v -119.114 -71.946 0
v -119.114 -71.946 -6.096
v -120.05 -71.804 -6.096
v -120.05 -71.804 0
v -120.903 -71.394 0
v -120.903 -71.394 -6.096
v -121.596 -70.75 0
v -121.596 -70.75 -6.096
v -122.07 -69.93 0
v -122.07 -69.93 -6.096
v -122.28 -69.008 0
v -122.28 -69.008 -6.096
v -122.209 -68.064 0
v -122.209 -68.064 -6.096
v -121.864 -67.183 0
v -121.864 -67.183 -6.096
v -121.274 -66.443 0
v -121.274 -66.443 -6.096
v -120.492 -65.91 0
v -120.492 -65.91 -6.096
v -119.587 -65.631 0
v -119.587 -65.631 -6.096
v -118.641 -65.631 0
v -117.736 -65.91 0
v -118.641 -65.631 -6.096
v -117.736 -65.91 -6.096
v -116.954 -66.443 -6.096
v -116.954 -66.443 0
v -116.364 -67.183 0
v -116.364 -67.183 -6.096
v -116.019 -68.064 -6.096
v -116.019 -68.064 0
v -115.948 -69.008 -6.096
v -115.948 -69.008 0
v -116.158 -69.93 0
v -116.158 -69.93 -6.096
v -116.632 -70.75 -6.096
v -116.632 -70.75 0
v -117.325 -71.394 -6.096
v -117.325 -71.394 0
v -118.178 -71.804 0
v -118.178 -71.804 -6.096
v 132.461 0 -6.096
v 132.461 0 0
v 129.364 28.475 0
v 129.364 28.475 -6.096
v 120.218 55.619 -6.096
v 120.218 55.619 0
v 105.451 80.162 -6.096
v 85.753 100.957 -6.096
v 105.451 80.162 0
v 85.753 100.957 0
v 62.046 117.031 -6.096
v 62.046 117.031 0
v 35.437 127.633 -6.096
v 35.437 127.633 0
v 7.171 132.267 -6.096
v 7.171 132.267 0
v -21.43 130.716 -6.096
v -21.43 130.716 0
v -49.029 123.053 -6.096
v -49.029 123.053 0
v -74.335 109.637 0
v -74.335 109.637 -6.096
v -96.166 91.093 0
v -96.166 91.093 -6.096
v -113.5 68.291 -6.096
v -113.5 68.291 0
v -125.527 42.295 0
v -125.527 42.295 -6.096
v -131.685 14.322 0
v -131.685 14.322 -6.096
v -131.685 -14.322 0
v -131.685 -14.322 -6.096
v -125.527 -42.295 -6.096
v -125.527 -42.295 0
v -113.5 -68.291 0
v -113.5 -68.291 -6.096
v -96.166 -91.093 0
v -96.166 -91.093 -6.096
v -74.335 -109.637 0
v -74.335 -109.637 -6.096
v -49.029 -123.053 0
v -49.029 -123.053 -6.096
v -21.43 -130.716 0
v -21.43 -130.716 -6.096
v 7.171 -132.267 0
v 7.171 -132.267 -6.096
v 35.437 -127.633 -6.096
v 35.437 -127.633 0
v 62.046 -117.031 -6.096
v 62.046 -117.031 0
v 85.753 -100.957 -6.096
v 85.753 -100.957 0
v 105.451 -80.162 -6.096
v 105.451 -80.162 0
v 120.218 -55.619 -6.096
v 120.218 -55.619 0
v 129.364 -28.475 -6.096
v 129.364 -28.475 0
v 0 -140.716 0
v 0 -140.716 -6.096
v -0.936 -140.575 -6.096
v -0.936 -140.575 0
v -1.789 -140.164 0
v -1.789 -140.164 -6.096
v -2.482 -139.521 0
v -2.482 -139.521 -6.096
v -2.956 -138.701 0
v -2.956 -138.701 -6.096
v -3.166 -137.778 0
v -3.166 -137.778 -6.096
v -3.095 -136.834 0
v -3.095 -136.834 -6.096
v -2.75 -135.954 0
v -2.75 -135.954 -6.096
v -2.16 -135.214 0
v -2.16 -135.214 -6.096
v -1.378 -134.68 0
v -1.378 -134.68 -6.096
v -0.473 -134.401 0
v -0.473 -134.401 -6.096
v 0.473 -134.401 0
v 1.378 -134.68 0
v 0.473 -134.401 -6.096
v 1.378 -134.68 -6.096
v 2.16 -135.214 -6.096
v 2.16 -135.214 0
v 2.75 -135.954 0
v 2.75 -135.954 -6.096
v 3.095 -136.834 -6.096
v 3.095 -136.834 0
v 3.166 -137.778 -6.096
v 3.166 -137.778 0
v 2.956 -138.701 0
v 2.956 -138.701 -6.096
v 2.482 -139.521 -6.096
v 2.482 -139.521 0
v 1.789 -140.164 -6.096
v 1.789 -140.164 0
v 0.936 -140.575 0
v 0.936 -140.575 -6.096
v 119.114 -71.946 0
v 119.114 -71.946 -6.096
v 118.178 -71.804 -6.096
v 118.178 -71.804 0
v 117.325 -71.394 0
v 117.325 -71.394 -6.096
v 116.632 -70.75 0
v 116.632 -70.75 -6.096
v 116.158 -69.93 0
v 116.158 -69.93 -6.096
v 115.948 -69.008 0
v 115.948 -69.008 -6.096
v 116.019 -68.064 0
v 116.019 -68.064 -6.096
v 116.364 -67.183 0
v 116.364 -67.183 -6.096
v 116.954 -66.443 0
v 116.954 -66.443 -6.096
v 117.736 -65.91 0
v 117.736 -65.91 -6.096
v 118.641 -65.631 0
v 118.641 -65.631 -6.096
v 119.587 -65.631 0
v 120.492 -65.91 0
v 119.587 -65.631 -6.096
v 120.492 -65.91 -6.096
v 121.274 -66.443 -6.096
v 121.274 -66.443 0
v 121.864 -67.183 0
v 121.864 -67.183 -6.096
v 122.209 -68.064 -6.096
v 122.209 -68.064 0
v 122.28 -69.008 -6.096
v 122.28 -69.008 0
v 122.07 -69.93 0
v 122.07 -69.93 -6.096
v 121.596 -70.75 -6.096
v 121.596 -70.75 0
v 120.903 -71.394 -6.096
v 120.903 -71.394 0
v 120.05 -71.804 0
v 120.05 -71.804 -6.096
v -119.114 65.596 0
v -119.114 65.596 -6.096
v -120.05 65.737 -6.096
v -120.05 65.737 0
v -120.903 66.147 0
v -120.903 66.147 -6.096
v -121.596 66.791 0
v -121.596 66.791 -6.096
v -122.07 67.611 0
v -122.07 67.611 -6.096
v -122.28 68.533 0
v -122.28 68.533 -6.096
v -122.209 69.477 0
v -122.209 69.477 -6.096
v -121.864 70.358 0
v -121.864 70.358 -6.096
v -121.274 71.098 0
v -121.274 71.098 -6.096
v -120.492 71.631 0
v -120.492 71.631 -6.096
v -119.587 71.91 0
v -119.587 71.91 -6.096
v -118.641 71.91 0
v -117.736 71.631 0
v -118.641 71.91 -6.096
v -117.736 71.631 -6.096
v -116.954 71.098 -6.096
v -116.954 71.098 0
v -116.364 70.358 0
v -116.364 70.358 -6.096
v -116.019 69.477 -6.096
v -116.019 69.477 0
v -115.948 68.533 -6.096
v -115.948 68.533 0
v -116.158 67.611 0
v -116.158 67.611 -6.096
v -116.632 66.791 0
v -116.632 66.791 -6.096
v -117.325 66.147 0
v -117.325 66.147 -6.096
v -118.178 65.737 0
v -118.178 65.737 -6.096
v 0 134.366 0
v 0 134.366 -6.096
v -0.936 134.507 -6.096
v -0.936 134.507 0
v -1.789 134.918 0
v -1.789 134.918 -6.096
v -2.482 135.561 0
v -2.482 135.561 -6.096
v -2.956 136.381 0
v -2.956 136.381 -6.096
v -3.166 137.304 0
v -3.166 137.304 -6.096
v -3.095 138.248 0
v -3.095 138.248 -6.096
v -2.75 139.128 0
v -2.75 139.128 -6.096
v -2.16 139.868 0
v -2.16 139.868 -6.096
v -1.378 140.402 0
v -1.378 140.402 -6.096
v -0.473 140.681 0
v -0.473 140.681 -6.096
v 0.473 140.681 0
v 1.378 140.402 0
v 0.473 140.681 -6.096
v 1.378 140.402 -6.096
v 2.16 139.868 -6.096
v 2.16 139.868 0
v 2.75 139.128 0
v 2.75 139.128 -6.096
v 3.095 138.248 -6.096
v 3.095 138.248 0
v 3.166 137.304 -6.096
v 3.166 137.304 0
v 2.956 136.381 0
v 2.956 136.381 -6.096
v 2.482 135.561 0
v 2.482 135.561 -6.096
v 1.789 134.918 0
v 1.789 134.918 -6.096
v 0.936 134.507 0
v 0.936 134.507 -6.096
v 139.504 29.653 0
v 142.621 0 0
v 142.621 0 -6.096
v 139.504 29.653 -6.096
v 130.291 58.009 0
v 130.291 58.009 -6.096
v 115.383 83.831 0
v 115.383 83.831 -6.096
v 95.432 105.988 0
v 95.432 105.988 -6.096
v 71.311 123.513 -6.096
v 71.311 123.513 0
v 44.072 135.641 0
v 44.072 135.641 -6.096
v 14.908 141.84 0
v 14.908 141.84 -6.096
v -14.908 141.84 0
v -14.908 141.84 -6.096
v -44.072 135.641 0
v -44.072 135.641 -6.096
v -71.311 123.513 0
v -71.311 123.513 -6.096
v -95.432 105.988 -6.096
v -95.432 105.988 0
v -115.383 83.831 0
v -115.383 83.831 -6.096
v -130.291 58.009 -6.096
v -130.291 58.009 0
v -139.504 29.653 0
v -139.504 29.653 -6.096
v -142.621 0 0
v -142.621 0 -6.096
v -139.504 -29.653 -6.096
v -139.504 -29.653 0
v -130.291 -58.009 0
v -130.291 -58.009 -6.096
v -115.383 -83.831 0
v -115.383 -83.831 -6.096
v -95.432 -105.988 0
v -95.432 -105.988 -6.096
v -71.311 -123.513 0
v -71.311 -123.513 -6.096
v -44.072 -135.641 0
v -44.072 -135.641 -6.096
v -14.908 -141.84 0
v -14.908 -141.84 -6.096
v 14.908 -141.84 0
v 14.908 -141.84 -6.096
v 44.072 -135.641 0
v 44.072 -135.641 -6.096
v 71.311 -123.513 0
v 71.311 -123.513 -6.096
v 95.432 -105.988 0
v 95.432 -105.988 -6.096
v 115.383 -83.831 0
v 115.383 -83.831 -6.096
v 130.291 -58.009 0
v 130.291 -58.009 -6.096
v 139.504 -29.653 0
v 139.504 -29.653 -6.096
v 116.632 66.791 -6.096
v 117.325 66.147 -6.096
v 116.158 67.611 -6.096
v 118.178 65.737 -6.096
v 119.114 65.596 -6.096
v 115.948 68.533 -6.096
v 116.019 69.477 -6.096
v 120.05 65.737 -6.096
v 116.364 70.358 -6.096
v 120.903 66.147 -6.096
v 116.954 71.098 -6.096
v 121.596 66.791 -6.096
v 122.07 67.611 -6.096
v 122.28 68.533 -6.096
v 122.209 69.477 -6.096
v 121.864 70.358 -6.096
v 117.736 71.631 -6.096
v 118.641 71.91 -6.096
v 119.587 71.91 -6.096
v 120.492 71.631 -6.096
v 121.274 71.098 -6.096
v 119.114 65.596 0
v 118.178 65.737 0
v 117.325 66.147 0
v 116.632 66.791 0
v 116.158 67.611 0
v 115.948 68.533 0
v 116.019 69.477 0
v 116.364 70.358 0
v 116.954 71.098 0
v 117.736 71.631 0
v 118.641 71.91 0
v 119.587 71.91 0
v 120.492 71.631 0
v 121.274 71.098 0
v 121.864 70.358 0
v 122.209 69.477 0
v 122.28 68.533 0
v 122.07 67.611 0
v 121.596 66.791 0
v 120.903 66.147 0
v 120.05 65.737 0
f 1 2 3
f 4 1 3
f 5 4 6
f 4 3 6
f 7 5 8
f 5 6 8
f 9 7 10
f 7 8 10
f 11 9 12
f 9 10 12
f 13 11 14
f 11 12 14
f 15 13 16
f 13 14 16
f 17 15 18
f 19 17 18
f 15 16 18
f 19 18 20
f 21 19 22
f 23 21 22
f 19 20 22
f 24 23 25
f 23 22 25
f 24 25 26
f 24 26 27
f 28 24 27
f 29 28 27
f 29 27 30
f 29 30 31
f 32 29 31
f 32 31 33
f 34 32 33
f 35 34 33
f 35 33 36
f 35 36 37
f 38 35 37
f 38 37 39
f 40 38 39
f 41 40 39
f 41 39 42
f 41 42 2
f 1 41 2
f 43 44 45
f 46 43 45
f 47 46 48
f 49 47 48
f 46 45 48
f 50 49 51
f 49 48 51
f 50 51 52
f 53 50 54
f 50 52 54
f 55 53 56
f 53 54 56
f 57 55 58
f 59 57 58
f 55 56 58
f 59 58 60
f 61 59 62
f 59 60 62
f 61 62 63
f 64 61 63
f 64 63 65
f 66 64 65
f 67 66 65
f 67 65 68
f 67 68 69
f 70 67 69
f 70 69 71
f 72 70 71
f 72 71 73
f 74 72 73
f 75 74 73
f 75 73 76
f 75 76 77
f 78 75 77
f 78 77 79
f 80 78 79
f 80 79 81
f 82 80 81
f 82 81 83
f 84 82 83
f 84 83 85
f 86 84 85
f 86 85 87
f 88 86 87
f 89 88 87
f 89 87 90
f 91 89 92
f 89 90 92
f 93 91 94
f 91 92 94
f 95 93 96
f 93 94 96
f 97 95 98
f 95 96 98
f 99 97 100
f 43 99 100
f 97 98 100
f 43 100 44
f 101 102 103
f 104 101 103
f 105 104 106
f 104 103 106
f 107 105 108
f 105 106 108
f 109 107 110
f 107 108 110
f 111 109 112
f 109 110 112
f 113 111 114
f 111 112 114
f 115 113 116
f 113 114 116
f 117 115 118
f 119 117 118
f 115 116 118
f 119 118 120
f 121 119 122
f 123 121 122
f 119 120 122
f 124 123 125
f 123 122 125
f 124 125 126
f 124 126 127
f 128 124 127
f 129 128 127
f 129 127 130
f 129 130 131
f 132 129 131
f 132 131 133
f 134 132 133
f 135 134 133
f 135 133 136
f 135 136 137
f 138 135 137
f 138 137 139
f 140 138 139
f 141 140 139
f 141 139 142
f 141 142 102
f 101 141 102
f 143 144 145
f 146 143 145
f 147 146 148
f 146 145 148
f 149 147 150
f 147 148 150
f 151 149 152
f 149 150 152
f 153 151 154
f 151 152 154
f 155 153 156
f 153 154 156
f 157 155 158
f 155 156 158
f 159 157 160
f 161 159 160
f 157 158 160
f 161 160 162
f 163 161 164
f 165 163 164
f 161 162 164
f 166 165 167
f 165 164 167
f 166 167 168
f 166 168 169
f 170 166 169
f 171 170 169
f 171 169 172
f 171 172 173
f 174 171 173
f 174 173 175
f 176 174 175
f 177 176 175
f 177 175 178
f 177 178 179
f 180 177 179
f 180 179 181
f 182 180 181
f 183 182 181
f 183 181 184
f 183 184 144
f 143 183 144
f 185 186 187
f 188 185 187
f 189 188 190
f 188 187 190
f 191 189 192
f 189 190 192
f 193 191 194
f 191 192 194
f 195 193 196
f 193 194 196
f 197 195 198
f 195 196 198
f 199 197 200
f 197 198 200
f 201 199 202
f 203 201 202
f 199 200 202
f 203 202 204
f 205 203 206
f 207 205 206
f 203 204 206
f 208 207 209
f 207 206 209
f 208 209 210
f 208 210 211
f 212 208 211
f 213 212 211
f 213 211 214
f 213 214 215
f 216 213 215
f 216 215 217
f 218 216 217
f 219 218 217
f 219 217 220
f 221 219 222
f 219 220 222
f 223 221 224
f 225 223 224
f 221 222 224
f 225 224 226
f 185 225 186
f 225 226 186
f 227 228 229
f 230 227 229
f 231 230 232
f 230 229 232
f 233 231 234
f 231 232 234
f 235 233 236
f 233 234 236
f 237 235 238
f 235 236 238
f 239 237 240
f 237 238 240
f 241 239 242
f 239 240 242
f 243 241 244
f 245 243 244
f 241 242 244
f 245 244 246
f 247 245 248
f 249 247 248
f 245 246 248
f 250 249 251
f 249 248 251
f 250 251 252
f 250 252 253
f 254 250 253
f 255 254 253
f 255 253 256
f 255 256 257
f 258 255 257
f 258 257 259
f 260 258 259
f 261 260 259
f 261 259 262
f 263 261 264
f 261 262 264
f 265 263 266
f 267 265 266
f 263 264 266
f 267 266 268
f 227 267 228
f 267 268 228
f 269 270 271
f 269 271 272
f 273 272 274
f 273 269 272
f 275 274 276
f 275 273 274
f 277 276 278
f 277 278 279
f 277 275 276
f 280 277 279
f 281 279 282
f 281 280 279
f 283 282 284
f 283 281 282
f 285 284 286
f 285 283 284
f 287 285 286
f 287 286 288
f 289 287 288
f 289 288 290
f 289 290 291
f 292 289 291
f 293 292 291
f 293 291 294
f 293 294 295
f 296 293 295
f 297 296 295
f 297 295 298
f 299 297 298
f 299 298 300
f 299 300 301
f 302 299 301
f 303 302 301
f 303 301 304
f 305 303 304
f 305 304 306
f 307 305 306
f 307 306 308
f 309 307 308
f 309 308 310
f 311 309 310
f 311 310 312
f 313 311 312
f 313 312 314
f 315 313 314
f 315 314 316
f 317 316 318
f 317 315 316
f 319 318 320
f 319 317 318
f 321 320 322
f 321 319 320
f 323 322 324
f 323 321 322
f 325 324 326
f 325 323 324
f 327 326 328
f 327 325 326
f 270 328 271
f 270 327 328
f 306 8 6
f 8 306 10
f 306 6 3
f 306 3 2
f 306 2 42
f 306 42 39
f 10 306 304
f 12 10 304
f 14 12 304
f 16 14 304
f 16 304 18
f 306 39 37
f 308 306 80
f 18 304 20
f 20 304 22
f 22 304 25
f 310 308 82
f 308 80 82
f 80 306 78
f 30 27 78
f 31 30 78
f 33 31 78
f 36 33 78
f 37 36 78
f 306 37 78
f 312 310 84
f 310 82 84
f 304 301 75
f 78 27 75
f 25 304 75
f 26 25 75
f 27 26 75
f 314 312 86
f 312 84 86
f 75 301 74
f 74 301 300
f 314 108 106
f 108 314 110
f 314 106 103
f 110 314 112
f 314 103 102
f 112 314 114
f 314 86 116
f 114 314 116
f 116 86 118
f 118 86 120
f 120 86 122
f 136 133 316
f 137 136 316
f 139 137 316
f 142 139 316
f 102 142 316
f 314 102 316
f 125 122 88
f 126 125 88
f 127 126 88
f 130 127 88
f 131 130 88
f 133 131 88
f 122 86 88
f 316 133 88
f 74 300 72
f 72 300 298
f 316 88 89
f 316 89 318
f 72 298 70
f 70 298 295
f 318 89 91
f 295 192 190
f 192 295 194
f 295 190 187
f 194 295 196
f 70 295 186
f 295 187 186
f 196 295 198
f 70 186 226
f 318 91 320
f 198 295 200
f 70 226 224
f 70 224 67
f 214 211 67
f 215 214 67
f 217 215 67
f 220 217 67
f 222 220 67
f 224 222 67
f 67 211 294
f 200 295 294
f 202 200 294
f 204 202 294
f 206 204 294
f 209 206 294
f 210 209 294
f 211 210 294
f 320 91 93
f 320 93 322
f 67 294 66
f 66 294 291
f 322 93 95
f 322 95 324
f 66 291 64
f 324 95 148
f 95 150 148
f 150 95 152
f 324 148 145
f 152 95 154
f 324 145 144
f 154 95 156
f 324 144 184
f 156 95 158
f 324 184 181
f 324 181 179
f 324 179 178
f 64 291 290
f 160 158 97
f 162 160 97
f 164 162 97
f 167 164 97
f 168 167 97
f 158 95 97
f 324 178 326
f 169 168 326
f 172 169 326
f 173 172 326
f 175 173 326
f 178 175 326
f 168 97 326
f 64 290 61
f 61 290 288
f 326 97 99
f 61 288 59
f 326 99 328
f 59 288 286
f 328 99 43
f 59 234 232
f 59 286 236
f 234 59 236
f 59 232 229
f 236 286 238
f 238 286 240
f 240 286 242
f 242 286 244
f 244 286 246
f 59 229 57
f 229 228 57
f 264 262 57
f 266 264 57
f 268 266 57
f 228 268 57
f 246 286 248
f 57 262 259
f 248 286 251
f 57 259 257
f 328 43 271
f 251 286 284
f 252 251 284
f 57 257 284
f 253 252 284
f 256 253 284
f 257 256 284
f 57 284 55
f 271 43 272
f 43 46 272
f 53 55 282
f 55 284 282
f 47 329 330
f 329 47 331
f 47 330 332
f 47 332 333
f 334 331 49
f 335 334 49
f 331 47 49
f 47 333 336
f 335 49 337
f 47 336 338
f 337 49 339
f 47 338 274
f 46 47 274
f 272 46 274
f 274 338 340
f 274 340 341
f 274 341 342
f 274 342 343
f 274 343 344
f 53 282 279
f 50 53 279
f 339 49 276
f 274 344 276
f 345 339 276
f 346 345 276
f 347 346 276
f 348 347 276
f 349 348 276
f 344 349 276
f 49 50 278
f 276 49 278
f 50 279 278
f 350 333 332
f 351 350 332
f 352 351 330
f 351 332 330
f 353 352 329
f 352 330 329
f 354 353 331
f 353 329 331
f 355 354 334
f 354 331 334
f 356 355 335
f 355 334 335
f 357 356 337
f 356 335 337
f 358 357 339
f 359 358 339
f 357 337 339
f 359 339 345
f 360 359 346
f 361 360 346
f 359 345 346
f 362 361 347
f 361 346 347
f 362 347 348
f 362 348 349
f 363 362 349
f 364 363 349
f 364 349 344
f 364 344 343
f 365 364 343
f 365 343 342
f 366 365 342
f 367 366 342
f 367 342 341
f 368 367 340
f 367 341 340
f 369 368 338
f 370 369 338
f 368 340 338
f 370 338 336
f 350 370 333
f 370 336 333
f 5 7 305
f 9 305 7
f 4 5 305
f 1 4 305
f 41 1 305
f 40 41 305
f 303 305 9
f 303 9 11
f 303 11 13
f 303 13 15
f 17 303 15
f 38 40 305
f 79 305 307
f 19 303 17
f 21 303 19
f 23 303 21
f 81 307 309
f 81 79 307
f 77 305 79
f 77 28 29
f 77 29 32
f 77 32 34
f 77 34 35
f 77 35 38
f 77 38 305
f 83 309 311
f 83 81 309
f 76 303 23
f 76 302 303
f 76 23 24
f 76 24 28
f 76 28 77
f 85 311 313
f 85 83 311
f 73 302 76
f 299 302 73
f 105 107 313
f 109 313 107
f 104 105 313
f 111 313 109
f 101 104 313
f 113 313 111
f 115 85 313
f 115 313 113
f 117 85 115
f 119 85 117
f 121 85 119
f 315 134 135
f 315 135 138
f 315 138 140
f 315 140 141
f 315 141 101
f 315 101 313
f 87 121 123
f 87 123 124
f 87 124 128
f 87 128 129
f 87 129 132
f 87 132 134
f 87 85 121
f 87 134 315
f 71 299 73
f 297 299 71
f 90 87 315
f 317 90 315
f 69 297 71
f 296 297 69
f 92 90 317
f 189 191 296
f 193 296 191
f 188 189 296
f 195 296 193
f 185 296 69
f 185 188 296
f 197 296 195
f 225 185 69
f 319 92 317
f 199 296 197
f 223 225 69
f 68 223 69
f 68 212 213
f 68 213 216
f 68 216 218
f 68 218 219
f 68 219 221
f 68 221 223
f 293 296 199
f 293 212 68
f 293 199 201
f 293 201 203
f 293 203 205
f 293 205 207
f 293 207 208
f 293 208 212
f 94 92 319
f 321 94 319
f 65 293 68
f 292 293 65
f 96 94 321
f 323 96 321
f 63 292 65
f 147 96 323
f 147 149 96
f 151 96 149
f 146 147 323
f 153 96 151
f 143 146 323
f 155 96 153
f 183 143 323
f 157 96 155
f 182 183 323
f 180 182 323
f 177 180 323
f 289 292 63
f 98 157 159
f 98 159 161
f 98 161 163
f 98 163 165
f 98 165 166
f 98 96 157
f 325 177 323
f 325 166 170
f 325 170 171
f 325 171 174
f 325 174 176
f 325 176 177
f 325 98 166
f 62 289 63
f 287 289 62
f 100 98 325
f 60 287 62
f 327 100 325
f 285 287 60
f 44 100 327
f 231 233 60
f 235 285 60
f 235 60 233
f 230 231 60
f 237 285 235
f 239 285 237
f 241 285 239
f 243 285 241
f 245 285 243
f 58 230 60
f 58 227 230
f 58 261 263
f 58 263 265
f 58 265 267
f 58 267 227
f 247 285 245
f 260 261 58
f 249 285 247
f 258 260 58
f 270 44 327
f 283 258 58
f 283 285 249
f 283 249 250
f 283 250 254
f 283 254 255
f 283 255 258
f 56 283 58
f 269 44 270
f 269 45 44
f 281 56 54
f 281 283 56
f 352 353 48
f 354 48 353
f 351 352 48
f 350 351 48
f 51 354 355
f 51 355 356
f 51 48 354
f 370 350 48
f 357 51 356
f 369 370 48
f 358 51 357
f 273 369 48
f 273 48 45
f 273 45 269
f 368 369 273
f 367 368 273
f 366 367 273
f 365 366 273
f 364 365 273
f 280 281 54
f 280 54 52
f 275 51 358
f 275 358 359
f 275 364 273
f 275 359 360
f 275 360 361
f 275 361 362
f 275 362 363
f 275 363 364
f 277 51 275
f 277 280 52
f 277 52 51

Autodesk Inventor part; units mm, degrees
ref_plane "YZ Plane" through (0, 0, 0) normal (1, 0, 0) x (0, 1, 0)
ref_plane "XZ Plane" through (0, 0, 0) normal (0, 1, 0) x (-1, 0, 0)
ref_plane "XY Plane" through (0, 0, 0) normal (0, 0, 1) x (1, 0, 0)
sketch "Sketch1" plane through (0, 0, 0) normal (0, 0, 1) x (1, 0, 0)
  circle A0 centre (0, 0) radius 142.621
  circle A1 centre (0, 0) radius 132.461
  point P0 (0, 137.541)
  point P1 (-119.114, 68.7705)
  point P2 (-119.114, -68.7705)
  point P3 (0, -137.541)
  point P4 (119.114, -68.7705)
  point P5 (119.114, 68.7705)
  dimension "d0" = 285.242
  dimension "d1" = 264.922
  dimension "d2" = 137.541
  dimension "d5" = 360
extrude "Extrusion1" add sketch "Sketch1" against normal blind 6.096
hole "Hole1" at (0, 137.541, 0) at (-119.114, 68.7705, 0) at (-119.114, -68.7705, 0) at (0, -137.541, 0) at (119.114, -68.7705, 0) at (119.114, 68.7705, 0) direction (0, 0, -1) diameter 6.35 depth 25.4 tip angle 118
properties part number "inner piece"
